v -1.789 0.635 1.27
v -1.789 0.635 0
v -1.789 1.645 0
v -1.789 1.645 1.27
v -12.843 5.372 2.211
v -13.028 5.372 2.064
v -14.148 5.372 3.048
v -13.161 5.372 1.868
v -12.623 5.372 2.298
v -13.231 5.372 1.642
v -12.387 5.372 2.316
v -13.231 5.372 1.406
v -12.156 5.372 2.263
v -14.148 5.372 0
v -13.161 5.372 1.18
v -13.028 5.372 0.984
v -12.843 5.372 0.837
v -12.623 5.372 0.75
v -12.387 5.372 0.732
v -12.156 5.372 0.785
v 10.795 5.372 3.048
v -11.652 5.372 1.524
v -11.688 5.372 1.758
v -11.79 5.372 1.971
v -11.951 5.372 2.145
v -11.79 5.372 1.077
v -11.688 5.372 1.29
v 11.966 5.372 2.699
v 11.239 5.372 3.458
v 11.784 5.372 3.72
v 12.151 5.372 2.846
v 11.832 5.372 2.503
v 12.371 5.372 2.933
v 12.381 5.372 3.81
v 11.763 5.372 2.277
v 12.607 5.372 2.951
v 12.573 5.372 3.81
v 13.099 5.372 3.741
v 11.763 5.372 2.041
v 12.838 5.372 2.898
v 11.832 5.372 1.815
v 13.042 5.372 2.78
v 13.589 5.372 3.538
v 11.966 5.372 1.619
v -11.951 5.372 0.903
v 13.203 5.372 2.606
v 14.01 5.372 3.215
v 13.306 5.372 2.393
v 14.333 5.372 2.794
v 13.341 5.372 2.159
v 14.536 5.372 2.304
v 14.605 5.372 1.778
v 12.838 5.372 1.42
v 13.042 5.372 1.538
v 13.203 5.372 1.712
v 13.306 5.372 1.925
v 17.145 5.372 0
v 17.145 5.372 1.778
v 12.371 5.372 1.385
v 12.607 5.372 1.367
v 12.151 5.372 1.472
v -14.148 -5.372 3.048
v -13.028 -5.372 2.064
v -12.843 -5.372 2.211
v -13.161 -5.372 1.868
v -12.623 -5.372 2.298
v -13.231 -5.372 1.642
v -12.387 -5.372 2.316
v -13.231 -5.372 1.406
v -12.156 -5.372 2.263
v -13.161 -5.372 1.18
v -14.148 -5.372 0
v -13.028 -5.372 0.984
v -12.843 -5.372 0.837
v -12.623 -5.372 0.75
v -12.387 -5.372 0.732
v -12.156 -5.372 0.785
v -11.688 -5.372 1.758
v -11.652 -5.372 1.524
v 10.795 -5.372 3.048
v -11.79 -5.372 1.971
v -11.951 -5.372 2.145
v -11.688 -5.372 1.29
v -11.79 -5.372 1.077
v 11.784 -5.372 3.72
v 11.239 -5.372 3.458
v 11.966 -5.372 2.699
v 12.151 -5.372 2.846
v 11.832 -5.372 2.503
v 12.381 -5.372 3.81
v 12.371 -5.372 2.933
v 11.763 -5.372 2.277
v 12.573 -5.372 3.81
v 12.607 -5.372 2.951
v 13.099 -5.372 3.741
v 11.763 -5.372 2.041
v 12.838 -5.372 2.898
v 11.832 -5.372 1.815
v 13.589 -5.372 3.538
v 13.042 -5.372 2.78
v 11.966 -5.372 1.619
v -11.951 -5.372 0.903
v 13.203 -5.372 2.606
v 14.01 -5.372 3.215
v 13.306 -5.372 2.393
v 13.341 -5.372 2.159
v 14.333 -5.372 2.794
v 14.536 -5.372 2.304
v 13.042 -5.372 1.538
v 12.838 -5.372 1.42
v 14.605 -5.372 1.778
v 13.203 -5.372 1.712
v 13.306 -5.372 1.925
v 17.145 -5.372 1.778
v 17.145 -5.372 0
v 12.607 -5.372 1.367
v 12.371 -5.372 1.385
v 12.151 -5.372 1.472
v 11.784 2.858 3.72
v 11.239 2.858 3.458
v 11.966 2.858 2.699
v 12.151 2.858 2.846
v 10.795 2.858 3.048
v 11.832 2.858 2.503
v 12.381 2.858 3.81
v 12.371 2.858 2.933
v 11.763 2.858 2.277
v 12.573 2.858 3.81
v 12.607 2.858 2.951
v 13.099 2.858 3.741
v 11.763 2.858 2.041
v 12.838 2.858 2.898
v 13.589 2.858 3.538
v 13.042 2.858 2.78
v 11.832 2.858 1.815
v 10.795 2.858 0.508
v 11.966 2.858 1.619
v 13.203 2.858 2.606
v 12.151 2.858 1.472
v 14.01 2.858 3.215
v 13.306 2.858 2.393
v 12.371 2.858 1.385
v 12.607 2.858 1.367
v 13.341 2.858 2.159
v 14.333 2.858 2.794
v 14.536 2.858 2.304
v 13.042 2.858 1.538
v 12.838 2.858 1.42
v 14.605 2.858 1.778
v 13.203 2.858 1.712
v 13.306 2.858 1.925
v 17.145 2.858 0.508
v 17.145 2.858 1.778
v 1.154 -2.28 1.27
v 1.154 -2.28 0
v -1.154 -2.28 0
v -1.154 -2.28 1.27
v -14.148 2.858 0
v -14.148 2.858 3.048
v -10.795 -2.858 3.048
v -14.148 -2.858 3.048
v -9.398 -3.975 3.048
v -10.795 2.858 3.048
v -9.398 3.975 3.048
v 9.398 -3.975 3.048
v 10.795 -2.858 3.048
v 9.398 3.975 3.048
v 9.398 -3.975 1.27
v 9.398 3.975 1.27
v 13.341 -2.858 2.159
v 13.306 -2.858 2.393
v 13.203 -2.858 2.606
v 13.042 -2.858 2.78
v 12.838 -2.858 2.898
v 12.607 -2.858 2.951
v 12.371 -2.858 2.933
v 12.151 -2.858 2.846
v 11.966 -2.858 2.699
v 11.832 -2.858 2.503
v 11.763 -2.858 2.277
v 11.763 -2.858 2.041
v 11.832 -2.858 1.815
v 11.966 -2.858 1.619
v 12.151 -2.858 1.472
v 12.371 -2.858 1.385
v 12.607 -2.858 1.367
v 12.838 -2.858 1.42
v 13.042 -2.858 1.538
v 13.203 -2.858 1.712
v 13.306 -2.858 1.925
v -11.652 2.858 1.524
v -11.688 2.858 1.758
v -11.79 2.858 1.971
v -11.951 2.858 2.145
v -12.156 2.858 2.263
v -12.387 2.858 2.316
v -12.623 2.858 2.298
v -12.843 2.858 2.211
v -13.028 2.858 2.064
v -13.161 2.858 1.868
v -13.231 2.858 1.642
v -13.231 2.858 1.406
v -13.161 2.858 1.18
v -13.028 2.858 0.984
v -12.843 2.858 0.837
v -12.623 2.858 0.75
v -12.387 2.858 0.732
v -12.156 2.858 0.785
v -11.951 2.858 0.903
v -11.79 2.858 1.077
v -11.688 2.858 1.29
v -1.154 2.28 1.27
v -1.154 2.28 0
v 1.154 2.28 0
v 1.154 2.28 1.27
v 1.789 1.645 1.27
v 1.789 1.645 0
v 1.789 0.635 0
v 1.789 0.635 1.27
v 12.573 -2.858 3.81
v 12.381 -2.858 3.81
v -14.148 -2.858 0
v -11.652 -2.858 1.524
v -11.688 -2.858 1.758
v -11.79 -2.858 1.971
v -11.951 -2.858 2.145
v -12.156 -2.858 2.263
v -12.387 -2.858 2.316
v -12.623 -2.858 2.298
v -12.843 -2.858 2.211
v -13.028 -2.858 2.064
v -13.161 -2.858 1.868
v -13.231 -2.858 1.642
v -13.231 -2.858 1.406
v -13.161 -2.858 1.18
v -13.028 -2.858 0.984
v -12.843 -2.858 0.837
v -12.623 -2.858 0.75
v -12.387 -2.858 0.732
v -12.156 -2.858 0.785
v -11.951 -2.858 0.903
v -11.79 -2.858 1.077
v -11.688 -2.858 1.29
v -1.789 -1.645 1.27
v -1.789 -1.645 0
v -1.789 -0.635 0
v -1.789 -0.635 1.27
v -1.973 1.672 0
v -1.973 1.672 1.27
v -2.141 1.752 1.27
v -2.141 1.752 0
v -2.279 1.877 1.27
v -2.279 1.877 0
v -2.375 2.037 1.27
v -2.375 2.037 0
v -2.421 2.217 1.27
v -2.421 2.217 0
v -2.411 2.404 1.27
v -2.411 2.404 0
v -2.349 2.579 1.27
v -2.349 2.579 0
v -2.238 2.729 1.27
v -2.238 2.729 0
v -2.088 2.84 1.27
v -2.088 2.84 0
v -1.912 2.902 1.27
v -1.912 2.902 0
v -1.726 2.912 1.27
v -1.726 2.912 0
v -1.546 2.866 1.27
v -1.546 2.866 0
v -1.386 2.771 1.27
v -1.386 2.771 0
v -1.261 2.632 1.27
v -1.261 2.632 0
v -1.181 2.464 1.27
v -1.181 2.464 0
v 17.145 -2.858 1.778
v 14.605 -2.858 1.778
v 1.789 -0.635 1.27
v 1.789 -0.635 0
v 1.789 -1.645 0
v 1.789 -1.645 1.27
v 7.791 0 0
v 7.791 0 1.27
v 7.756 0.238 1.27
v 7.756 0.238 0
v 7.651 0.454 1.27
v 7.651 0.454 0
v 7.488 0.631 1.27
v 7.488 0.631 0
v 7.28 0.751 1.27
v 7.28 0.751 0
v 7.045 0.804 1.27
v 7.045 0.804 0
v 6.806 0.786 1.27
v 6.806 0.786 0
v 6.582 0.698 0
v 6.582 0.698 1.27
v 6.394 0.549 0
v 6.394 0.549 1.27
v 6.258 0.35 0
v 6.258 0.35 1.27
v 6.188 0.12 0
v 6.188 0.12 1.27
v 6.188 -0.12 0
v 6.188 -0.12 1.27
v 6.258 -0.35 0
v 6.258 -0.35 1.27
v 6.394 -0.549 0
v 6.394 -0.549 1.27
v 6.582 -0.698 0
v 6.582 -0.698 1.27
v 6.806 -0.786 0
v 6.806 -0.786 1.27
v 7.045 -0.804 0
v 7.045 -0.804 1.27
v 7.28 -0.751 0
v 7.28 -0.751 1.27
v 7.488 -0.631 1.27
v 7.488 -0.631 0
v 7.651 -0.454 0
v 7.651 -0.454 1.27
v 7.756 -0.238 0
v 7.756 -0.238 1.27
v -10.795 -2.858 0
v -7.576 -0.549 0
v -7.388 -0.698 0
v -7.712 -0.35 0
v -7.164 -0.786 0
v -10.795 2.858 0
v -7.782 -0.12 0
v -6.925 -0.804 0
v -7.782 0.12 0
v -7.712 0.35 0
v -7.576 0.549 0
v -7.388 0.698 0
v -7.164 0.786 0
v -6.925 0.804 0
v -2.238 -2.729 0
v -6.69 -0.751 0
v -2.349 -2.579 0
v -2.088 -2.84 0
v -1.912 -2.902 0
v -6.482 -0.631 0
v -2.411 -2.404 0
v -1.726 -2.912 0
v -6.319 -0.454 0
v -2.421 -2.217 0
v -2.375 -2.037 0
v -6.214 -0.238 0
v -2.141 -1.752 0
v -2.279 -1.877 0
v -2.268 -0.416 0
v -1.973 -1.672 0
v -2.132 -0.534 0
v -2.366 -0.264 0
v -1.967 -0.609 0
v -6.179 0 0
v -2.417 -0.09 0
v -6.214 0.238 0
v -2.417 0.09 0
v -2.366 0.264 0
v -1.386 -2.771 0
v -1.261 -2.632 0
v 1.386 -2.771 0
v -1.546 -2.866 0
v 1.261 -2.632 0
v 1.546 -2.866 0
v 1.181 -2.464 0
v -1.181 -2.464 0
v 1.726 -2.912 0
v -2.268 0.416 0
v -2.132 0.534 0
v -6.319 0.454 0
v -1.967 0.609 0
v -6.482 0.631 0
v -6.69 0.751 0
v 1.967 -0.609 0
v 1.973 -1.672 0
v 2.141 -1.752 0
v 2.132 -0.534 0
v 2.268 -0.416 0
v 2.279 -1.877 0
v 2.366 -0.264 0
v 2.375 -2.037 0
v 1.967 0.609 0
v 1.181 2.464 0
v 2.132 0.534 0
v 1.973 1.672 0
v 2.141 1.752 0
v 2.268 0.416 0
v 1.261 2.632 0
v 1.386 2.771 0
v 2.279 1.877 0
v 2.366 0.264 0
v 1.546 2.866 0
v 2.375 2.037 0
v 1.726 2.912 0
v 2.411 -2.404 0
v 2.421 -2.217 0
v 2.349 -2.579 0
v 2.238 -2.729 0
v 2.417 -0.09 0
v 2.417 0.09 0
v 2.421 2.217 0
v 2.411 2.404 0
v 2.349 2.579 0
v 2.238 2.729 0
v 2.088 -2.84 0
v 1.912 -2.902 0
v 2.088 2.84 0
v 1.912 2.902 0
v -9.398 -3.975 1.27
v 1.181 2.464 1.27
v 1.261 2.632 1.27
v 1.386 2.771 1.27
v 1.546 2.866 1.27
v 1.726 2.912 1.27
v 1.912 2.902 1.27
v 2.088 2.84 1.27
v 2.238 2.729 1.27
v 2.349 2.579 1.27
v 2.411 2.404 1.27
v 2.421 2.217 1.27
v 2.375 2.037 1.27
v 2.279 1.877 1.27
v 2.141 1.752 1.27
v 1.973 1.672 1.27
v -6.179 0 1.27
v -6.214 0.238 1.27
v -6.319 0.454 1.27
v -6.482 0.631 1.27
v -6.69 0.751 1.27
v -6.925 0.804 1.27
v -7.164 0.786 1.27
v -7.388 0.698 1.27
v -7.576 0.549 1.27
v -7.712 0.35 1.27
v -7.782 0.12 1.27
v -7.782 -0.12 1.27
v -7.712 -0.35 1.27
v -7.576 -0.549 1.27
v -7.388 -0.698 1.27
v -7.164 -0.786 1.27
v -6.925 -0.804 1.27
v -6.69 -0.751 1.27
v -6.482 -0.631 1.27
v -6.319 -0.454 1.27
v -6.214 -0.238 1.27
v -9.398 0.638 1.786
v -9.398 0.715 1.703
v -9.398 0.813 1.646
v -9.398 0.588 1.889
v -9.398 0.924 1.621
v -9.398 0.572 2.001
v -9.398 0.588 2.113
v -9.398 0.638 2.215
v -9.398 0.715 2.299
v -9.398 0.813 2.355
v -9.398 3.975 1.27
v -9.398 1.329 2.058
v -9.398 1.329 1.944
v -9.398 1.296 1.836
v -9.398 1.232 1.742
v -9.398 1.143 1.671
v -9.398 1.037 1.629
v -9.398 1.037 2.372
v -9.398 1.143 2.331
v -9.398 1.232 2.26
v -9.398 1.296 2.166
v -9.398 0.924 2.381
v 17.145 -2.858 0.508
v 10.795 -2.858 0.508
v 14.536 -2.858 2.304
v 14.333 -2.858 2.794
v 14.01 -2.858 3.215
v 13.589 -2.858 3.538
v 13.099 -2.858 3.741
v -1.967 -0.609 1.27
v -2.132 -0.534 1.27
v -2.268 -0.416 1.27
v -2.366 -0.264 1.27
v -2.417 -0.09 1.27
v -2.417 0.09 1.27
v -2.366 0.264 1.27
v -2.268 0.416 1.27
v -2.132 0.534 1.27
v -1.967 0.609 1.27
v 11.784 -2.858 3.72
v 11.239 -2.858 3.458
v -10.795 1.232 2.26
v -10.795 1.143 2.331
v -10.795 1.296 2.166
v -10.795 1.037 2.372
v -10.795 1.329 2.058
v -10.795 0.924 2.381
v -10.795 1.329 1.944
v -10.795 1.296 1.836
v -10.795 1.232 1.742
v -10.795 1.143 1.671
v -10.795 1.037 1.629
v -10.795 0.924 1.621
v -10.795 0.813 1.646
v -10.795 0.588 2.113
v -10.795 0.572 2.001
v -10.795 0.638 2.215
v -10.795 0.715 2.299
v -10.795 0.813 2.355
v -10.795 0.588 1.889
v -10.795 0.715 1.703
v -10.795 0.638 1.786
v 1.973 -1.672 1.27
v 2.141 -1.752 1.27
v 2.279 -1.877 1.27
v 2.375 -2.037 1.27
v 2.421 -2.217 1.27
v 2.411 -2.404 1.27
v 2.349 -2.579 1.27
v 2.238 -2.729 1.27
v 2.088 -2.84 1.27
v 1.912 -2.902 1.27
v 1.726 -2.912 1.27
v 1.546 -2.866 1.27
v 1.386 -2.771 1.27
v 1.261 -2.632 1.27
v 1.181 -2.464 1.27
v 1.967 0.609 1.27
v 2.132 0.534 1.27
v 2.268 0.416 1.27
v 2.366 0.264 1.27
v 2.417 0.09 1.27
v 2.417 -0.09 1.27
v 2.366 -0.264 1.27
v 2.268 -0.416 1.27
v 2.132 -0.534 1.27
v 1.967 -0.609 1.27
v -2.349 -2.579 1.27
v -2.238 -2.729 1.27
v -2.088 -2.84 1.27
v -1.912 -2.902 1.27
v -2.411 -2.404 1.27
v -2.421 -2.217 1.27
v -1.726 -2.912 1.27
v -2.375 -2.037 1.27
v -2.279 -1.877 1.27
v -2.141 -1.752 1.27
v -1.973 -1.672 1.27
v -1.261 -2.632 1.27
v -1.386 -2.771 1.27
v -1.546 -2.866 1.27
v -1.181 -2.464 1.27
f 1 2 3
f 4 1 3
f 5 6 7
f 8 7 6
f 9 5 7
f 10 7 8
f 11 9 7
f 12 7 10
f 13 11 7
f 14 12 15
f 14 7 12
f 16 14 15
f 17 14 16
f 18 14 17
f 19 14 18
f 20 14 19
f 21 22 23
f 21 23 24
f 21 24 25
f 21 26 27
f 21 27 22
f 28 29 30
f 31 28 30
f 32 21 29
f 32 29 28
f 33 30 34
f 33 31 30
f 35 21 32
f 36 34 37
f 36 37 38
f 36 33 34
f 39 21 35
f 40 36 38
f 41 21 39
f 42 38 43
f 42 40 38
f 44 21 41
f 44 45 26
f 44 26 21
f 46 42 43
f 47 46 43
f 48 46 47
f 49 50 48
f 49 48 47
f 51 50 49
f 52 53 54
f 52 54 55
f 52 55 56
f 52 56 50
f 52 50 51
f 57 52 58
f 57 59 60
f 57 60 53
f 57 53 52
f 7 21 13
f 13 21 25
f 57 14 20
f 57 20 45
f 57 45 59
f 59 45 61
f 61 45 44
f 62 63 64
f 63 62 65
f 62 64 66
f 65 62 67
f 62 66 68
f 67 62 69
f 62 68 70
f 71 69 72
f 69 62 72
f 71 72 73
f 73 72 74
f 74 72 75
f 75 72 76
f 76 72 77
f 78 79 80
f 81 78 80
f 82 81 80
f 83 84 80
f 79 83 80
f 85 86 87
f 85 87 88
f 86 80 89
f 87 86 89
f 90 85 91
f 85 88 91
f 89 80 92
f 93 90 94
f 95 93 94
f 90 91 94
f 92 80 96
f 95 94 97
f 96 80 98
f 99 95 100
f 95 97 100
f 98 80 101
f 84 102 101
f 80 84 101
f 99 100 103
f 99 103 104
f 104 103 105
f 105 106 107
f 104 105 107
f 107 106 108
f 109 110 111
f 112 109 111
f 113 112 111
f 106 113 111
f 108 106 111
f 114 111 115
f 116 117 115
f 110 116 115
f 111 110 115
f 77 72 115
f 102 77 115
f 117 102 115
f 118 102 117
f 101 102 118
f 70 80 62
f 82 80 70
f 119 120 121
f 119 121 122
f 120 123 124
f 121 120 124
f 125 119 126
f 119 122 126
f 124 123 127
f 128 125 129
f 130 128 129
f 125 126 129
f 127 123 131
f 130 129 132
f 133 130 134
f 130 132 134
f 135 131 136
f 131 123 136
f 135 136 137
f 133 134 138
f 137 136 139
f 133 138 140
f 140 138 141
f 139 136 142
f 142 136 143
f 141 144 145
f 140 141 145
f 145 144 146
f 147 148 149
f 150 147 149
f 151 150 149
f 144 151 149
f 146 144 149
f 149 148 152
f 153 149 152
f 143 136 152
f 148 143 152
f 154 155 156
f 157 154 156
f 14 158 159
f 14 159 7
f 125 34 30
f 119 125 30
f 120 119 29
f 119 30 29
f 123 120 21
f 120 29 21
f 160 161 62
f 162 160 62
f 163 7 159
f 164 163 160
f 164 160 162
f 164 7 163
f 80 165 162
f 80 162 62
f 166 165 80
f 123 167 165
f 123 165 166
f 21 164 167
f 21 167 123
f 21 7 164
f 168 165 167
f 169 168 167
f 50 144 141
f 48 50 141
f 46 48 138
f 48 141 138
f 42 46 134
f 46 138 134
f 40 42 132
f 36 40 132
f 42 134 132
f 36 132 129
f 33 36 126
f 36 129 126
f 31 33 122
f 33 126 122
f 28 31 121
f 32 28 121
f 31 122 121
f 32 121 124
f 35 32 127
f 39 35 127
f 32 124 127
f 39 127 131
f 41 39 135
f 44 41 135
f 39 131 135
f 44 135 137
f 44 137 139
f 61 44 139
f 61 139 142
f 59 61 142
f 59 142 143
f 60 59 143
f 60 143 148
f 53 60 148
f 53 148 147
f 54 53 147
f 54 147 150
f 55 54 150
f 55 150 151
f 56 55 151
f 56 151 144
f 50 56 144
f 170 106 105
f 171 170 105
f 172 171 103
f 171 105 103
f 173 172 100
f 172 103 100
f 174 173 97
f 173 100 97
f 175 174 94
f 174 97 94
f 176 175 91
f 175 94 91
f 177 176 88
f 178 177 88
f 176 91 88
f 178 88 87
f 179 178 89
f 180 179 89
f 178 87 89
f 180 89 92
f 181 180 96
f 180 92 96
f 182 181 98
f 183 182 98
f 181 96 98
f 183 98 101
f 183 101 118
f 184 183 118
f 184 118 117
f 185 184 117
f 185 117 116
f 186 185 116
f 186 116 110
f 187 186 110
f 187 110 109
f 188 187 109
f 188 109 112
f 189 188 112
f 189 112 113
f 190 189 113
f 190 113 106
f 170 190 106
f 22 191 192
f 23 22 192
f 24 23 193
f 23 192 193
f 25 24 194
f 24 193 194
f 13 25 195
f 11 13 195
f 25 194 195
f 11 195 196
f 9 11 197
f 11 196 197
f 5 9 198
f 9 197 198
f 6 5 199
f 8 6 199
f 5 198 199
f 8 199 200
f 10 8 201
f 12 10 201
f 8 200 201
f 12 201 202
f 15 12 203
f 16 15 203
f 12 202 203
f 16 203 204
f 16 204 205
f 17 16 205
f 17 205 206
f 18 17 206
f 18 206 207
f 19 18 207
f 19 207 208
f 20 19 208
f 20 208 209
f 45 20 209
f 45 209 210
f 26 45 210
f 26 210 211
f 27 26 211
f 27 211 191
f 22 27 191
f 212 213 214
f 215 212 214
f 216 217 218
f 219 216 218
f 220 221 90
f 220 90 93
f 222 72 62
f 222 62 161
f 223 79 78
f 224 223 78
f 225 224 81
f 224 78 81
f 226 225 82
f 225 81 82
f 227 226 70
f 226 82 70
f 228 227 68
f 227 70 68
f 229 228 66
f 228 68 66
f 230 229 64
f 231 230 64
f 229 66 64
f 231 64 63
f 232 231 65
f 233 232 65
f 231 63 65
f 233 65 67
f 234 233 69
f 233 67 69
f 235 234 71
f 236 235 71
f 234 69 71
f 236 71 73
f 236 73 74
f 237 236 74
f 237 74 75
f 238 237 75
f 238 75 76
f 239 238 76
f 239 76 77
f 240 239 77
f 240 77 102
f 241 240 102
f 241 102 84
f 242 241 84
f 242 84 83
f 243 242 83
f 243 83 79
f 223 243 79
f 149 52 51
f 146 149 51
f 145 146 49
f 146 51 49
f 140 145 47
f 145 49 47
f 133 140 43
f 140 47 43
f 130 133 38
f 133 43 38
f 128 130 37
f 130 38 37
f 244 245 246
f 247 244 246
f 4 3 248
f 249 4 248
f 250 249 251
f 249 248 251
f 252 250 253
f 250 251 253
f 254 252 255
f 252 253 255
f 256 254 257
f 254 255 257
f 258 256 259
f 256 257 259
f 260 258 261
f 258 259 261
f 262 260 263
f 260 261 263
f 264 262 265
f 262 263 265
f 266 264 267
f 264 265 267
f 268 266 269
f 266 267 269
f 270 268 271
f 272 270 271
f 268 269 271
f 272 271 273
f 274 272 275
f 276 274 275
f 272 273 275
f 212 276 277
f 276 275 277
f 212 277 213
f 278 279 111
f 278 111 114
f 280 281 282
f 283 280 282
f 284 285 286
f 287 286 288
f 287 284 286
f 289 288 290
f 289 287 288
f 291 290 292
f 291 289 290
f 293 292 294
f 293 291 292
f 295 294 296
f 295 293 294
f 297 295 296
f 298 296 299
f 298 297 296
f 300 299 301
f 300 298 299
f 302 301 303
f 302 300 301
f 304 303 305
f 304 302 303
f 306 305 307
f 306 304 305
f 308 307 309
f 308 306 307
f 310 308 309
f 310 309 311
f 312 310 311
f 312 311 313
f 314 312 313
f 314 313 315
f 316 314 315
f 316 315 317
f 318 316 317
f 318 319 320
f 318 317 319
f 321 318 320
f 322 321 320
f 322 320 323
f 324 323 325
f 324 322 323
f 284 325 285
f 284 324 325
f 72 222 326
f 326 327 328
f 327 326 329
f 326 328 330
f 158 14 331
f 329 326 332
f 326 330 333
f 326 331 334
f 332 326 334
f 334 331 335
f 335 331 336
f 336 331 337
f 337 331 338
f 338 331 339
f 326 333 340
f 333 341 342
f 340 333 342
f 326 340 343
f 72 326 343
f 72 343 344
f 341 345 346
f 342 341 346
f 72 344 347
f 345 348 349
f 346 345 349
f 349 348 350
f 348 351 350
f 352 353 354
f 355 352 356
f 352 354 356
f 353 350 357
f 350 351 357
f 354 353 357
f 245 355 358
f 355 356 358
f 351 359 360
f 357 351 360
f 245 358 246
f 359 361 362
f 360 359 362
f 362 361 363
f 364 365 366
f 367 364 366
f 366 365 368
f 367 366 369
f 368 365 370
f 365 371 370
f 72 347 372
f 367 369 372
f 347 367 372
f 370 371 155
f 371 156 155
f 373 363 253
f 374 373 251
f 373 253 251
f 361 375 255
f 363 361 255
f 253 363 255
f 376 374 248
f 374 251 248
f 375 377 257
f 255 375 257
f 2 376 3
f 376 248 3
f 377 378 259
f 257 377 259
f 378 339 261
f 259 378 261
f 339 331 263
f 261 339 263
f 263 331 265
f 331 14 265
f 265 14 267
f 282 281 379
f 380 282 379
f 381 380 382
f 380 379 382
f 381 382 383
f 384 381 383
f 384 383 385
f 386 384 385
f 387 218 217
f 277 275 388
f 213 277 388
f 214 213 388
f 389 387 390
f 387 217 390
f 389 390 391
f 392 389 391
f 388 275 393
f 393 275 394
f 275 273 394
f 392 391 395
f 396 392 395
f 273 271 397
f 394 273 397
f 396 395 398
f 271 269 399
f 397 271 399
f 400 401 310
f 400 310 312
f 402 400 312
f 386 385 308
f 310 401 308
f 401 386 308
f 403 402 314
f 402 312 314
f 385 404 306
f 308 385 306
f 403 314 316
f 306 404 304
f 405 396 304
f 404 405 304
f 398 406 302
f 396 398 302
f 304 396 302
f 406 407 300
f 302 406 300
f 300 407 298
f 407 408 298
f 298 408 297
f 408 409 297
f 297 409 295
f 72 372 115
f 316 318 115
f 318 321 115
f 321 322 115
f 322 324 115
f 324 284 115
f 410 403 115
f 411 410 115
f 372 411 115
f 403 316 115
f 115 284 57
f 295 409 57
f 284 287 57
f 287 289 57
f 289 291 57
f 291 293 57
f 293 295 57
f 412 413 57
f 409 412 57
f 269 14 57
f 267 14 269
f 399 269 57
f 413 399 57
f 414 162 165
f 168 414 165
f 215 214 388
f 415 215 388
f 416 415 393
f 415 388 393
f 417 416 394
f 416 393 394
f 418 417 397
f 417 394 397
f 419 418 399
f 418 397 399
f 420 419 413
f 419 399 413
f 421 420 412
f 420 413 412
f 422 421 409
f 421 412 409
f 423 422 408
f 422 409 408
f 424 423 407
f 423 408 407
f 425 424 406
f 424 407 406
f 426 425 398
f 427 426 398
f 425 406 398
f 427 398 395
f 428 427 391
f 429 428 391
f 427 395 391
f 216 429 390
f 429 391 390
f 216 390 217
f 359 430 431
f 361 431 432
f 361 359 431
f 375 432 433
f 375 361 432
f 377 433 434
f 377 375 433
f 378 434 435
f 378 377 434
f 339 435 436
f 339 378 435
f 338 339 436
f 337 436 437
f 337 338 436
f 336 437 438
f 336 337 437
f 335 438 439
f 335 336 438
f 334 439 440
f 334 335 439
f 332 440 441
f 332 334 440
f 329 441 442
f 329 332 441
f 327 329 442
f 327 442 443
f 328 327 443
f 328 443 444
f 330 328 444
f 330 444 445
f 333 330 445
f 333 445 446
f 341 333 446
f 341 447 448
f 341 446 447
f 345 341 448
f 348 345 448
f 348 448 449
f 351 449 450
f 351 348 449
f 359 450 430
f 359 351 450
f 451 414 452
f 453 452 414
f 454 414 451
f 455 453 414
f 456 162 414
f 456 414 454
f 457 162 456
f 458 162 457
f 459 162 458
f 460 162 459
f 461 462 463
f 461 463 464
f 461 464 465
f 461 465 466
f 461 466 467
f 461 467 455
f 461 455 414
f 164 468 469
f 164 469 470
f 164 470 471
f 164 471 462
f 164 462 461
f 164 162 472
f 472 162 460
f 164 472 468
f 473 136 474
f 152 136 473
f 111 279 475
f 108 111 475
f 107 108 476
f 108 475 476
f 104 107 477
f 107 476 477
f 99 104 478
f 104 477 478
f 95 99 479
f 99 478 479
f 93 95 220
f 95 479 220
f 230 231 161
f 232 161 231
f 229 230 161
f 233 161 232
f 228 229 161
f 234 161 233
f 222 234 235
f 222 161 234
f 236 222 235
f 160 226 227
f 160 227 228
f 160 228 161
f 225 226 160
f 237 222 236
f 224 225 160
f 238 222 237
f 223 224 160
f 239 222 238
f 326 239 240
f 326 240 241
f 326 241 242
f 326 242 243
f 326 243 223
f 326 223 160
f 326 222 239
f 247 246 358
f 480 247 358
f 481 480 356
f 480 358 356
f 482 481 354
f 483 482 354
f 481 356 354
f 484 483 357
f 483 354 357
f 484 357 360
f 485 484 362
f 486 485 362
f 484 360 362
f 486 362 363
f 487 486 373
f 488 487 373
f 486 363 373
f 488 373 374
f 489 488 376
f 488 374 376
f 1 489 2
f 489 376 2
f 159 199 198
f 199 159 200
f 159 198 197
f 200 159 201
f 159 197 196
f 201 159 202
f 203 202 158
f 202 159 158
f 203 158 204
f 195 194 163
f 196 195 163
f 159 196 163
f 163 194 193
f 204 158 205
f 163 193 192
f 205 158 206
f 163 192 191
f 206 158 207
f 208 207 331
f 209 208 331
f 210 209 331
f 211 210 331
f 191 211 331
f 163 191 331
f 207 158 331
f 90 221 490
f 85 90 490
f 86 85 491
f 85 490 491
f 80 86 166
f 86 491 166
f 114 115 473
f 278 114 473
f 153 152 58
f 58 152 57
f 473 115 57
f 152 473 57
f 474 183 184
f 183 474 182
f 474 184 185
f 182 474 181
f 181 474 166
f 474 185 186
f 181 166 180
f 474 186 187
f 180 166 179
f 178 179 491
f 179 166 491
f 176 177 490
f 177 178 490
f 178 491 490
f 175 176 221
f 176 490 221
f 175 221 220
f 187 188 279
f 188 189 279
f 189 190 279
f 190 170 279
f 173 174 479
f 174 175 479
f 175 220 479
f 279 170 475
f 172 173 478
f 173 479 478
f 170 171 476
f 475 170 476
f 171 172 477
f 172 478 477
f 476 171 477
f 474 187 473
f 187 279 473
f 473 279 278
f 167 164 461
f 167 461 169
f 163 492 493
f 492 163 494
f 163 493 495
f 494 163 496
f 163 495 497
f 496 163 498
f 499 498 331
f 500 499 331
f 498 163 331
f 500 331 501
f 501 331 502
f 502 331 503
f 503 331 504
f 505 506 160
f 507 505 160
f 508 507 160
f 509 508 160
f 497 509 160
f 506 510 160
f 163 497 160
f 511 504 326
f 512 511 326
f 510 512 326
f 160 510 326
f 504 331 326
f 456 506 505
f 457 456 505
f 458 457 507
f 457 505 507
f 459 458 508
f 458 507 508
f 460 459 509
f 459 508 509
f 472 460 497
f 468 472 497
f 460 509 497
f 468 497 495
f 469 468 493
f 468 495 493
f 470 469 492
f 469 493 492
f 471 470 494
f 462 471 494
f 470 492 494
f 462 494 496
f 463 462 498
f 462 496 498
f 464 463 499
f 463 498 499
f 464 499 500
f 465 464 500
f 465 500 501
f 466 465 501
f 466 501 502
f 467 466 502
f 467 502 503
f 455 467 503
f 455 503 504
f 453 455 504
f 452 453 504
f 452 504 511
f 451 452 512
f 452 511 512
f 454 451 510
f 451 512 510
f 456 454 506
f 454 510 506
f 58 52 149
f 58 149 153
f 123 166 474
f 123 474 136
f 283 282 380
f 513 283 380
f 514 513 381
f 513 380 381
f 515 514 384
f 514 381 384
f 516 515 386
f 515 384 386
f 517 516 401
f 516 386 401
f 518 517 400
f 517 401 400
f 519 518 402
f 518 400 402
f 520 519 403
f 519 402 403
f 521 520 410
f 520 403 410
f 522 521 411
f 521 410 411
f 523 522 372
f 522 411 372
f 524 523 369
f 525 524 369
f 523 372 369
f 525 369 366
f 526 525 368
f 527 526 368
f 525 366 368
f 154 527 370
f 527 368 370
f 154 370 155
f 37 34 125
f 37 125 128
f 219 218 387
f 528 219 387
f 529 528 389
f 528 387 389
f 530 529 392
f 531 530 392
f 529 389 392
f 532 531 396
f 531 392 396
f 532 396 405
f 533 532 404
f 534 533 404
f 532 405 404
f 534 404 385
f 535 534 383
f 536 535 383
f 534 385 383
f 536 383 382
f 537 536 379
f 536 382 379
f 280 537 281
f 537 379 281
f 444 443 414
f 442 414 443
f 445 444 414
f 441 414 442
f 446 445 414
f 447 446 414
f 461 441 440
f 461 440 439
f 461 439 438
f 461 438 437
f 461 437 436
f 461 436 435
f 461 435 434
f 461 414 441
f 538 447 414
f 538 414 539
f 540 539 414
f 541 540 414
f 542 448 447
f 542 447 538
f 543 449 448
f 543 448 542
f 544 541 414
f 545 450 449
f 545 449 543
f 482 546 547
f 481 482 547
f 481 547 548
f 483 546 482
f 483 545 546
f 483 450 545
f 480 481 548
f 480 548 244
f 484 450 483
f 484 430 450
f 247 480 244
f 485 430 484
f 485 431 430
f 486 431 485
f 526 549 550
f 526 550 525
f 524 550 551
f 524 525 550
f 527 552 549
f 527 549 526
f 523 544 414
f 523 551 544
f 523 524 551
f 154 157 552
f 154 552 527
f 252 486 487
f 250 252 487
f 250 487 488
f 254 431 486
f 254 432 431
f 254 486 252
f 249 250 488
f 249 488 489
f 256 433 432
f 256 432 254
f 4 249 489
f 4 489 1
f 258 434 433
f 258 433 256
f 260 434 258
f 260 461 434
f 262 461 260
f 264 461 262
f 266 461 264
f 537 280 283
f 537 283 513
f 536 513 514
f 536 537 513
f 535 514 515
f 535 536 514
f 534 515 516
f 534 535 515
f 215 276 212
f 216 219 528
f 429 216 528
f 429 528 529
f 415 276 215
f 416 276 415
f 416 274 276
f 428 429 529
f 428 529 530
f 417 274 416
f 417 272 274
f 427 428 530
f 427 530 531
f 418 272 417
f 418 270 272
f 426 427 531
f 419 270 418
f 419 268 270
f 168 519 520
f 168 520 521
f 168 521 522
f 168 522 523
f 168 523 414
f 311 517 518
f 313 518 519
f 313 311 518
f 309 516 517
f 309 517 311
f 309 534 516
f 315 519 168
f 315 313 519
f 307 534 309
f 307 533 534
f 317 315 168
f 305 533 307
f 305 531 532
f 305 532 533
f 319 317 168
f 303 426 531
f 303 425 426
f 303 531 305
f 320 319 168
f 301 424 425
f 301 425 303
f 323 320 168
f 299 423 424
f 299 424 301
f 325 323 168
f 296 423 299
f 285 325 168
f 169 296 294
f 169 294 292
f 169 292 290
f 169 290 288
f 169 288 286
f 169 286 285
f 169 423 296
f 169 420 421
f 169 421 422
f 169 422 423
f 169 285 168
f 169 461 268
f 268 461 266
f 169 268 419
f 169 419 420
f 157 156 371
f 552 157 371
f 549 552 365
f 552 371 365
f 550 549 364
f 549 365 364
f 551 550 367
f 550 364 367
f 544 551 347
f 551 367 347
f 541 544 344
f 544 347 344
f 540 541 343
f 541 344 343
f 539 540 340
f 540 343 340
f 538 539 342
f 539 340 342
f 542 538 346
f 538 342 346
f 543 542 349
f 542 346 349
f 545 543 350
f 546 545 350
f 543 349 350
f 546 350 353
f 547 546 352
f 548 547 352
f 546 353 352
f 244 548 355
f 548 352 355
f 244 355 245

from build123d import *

# Parameters (mm, degrees)
F0_W         = 3.3528
F0_H         = 2.5146
F0_R         = 0.80645
F1_DEPTH     = 3.048
F2_W         = 2.54
F2_H         = 10.7442
F2_W_2       = 18.796
F2_H_2       = 7.9502
F3_DEPTH     = 1.27
F4_W         = 6.35
F4_H         = 5.715
F5_DEPTH     = 2.54
F6_R         = 0.79375
F7_DEPTH     = 10.7452
F8_DEPTH     = 0.508
F9_W         = 3.81
F9_H         = 2.5146
F10_DEPTH    = 0.762
F11_T1_DEPTH = 10.445747458
F11_T3_DEPTH = 10.445747458
F11_T5_DEPTH = 12.6746
F11_T7_DEPTH = 12.6746
F12_R        = 0.381
F8_FACE_W    = 7.9502
F8_FACE_H    = 1.778
F13_DEPTH    = 1.397


# Not quite as in the source:
# - a fillet or chamfer that OpenCascade refuses, or shapes differently, is made with other operations: its cross-section is extruded or revolved along the edge and cut away or added


with BuildPart() as f1:
    # F0 (on Top) → F1 (new body)
    with BuildSketch(Plane.XY):
        with Locations((-12.4714, 4.1148)):
            Rectangle(F0_W, F0_H)
        with Locations((-12.4714, -4.1148)):
            Rectangle(F0_W, F0_H)
        Polygon((10.795, 5.3721), (-10.795, 5.3721), (-10.795, 2.8575), (-10.795, -2.8575), (-10.795, -5.3721), (10.795, -5.3721), (17.145, -5.3721), (17.145, 5.3721), align=None)
        with Locations((-6.985, 0)):
            Circle(F0_R, mode=Mode.SUBTRACT)
        with BuildLine():
            ThreePointArc((-1.7885716042, 1.644670926), (-2.2375844102, 2.728683732), (-1.1535716042, 2.279670926))
            Line((-1.1535716042, 2.279670926), (1.1535716042, 2.279670926))
            ThreePointArc((1.1535716042, 2.279670926), (2.2375844102, 2.728683732), (1.7885716042, 1.644670926))
            Line((1.7885716042, 1.644670926), (1.7885716042, 0.635))
            ThreePointArc((1.7885716042, 0.635), (2.4235716042, 0), (1.7885716042, -0.635))
            Line((1.7885716042, -0.635), (1.7885716042, -1.644670926))
            ThreePointArc((1.7885716042, -1.644670926), (2.2375844102, -2.728683732), (1.1535716042, -2.279670926))
            Line((1.1535716042, -2.279670926), (-1.1535716042, -2.279670926))
            ThreePointArc((-1.1535716042, -2.279670926), (-2.2375844102, -2.728683732), (-1.7885716042, -1.644670926))
            Line((-1.7885716042, -1.644670926), (-1.7885716042, -0.635))
            ThreePointArc((-1.7885716042, -0.635), (-2.4235716042, 0), (-1.7885716042, 0.635))
            Line((-1.7885716042, 0.635), (-1.7885716042, 1.644670926))
        make_face(mode=Mode.SUBTRACT)
        with Locations((6.985, 0)):
            Circle(F0_R, mode=Mode.SUBTRACT)
    extrude(amount=F1_DEPTH)

    # F2 (on face) → F3 (cut)
    with BuildSketch(Plane.XY.offset(3.048)):
        with Locations((15.875, 0)):
            Rectangle(F2_W, F2_H)
        Rectangle(F2_W_2, F2_H_2)
    extrude(amount=-F3_DEPTH, mode=Mode.SUBTRACT)

    # F4 (on face) → F5 (cut)
    with BuildSketch(Plane.XY.offset(3.048)):
        with Locations((13.97, 0)):
            Rectangle(F4_W, F4_H)
    extrude(amount=-F5_DEPTH, mode=Mode.SUBTRACT)

    # F6 (on face) → F7 (cut, through all)
    with BuildSketch(Plane.XZ.offset(5.3721)):
        with Locations((-12.446, 1.524)):
            Circle(F6_R)
        with Locations((12.5476, 2.159)):
            Circle(F6_R)
    extrude(amount=-F7_DEPTH, mode=Mode.SUBTRACT)

    # F8 (cut): a face of the model
    f8_faces = [f1.faces().sort_by_distance(p)[0] for p in [
        (0, 3.7710178361, 1.778),
    ]]
    extrude(f8_faces, amount=-F8_DEPTH, mode=Mode.SUBTRACT)

    # F9 (on face) → F10 (join)
    with BuildSketch(Plane.XY.offset(3.048)):
        with Locations((12.7, 4.1148)):
            Rectangle(F9_W, F9_H)
        with Locations((12.7, -4.1148)):
            Rectangle(F9_W, F9_H)
    extrude(amount=F10_DEPTH)

    # F11: fillet of radius 2.032 on 4 edges, made by hand

    # F11_s2 → F11_t1 (cut)
    with BuildSketch(Plane.XZ.offset(-1.108073729)):
        with BuildLine():
            ThreePointArc((12.3812294916, 3.81), (11.5013476813, 3.6096200479), (10.795, 3.048))
            Line((10.795, 3.048), (10.795, 3.81))
            Line((10.795, 3.81), (12.3812294916, 3.81))
        make_face()
    extrude(amount=F11_T1_DEPTH, mode=Mode.SUBTRACT)

    # F11_s4 → F11_t3 (cut)
    with BuildSketch(Plane.XZ.offset(-9.337673729)):
        with BuildLine():
            ThreePointArc((12.3812294916, 3.81), (11.5013476813, 3.6096200479), (10.795, 3.048))
            Line((10.795, 3.048), (10.795, 3.81))
            Line((10.795, 3.81), (12.3812294916, 3.81))
        make_face()
    extrude(amount=F11_T3_DEPTH, mode=Mode.SUBTRACT)

    # F11_s6 → F11_t5 (cut)
    with BuildSketch(Plane.XZ.offset(-10.4521)):
        with BuildLine():
            ThreePointArc((14.605, 1.778), (14.0098409794, 3.2148409794), (12.573, 3.81))
            Line((12.573, 3.81), (14.605, 3.81))
            Line((14.605, 3.81), (14.605, 1.778))
        make_face()
    extrude(amount=F11_T5_DEPTH, mode=Mode.SUBTRACT)

    # F11_s8 → F11_t7 (cut)
    with BuildSketch(Plane.XZ.offset(-2.2225)):
        with BuildLine():
            ThreePointArc((14.605, 1.778), (14.0098409794, 3.2148409794), (12.573, 3.81))
            Line((12.573, 3.81), (14.605, 3.81))
            Line((14.605, 3.81), (14.605, 1.778))
        make_face()
    extrude(amount=F11_T7_DEPTH, mode=Mode.SUBTRACT)

    # F12 (on face) + F8_face (on face) → F13 (cut, through all)
    with BuildSketch(Plane(origin=(-10.795, 0, 0), x_dir=(0, -1, 0), z_dir=(-1, 0, 0))):
        with Locations((-0.9525, 2.0008196589)):
            Circle(F12_R)
    with BuildSketch(Plane(origin=(-9.398, 0, 2.159), x_dir=(0, 1, 0), z_dir=(1, 0, 0))):
        Rectangle(F8_FACE_W, F8_FACE_H)
    extrude(amount=-F13_DEPTH, dir=(-1, 0, 0), mode=Mode.SUBTRACT)


solid = f1.part
